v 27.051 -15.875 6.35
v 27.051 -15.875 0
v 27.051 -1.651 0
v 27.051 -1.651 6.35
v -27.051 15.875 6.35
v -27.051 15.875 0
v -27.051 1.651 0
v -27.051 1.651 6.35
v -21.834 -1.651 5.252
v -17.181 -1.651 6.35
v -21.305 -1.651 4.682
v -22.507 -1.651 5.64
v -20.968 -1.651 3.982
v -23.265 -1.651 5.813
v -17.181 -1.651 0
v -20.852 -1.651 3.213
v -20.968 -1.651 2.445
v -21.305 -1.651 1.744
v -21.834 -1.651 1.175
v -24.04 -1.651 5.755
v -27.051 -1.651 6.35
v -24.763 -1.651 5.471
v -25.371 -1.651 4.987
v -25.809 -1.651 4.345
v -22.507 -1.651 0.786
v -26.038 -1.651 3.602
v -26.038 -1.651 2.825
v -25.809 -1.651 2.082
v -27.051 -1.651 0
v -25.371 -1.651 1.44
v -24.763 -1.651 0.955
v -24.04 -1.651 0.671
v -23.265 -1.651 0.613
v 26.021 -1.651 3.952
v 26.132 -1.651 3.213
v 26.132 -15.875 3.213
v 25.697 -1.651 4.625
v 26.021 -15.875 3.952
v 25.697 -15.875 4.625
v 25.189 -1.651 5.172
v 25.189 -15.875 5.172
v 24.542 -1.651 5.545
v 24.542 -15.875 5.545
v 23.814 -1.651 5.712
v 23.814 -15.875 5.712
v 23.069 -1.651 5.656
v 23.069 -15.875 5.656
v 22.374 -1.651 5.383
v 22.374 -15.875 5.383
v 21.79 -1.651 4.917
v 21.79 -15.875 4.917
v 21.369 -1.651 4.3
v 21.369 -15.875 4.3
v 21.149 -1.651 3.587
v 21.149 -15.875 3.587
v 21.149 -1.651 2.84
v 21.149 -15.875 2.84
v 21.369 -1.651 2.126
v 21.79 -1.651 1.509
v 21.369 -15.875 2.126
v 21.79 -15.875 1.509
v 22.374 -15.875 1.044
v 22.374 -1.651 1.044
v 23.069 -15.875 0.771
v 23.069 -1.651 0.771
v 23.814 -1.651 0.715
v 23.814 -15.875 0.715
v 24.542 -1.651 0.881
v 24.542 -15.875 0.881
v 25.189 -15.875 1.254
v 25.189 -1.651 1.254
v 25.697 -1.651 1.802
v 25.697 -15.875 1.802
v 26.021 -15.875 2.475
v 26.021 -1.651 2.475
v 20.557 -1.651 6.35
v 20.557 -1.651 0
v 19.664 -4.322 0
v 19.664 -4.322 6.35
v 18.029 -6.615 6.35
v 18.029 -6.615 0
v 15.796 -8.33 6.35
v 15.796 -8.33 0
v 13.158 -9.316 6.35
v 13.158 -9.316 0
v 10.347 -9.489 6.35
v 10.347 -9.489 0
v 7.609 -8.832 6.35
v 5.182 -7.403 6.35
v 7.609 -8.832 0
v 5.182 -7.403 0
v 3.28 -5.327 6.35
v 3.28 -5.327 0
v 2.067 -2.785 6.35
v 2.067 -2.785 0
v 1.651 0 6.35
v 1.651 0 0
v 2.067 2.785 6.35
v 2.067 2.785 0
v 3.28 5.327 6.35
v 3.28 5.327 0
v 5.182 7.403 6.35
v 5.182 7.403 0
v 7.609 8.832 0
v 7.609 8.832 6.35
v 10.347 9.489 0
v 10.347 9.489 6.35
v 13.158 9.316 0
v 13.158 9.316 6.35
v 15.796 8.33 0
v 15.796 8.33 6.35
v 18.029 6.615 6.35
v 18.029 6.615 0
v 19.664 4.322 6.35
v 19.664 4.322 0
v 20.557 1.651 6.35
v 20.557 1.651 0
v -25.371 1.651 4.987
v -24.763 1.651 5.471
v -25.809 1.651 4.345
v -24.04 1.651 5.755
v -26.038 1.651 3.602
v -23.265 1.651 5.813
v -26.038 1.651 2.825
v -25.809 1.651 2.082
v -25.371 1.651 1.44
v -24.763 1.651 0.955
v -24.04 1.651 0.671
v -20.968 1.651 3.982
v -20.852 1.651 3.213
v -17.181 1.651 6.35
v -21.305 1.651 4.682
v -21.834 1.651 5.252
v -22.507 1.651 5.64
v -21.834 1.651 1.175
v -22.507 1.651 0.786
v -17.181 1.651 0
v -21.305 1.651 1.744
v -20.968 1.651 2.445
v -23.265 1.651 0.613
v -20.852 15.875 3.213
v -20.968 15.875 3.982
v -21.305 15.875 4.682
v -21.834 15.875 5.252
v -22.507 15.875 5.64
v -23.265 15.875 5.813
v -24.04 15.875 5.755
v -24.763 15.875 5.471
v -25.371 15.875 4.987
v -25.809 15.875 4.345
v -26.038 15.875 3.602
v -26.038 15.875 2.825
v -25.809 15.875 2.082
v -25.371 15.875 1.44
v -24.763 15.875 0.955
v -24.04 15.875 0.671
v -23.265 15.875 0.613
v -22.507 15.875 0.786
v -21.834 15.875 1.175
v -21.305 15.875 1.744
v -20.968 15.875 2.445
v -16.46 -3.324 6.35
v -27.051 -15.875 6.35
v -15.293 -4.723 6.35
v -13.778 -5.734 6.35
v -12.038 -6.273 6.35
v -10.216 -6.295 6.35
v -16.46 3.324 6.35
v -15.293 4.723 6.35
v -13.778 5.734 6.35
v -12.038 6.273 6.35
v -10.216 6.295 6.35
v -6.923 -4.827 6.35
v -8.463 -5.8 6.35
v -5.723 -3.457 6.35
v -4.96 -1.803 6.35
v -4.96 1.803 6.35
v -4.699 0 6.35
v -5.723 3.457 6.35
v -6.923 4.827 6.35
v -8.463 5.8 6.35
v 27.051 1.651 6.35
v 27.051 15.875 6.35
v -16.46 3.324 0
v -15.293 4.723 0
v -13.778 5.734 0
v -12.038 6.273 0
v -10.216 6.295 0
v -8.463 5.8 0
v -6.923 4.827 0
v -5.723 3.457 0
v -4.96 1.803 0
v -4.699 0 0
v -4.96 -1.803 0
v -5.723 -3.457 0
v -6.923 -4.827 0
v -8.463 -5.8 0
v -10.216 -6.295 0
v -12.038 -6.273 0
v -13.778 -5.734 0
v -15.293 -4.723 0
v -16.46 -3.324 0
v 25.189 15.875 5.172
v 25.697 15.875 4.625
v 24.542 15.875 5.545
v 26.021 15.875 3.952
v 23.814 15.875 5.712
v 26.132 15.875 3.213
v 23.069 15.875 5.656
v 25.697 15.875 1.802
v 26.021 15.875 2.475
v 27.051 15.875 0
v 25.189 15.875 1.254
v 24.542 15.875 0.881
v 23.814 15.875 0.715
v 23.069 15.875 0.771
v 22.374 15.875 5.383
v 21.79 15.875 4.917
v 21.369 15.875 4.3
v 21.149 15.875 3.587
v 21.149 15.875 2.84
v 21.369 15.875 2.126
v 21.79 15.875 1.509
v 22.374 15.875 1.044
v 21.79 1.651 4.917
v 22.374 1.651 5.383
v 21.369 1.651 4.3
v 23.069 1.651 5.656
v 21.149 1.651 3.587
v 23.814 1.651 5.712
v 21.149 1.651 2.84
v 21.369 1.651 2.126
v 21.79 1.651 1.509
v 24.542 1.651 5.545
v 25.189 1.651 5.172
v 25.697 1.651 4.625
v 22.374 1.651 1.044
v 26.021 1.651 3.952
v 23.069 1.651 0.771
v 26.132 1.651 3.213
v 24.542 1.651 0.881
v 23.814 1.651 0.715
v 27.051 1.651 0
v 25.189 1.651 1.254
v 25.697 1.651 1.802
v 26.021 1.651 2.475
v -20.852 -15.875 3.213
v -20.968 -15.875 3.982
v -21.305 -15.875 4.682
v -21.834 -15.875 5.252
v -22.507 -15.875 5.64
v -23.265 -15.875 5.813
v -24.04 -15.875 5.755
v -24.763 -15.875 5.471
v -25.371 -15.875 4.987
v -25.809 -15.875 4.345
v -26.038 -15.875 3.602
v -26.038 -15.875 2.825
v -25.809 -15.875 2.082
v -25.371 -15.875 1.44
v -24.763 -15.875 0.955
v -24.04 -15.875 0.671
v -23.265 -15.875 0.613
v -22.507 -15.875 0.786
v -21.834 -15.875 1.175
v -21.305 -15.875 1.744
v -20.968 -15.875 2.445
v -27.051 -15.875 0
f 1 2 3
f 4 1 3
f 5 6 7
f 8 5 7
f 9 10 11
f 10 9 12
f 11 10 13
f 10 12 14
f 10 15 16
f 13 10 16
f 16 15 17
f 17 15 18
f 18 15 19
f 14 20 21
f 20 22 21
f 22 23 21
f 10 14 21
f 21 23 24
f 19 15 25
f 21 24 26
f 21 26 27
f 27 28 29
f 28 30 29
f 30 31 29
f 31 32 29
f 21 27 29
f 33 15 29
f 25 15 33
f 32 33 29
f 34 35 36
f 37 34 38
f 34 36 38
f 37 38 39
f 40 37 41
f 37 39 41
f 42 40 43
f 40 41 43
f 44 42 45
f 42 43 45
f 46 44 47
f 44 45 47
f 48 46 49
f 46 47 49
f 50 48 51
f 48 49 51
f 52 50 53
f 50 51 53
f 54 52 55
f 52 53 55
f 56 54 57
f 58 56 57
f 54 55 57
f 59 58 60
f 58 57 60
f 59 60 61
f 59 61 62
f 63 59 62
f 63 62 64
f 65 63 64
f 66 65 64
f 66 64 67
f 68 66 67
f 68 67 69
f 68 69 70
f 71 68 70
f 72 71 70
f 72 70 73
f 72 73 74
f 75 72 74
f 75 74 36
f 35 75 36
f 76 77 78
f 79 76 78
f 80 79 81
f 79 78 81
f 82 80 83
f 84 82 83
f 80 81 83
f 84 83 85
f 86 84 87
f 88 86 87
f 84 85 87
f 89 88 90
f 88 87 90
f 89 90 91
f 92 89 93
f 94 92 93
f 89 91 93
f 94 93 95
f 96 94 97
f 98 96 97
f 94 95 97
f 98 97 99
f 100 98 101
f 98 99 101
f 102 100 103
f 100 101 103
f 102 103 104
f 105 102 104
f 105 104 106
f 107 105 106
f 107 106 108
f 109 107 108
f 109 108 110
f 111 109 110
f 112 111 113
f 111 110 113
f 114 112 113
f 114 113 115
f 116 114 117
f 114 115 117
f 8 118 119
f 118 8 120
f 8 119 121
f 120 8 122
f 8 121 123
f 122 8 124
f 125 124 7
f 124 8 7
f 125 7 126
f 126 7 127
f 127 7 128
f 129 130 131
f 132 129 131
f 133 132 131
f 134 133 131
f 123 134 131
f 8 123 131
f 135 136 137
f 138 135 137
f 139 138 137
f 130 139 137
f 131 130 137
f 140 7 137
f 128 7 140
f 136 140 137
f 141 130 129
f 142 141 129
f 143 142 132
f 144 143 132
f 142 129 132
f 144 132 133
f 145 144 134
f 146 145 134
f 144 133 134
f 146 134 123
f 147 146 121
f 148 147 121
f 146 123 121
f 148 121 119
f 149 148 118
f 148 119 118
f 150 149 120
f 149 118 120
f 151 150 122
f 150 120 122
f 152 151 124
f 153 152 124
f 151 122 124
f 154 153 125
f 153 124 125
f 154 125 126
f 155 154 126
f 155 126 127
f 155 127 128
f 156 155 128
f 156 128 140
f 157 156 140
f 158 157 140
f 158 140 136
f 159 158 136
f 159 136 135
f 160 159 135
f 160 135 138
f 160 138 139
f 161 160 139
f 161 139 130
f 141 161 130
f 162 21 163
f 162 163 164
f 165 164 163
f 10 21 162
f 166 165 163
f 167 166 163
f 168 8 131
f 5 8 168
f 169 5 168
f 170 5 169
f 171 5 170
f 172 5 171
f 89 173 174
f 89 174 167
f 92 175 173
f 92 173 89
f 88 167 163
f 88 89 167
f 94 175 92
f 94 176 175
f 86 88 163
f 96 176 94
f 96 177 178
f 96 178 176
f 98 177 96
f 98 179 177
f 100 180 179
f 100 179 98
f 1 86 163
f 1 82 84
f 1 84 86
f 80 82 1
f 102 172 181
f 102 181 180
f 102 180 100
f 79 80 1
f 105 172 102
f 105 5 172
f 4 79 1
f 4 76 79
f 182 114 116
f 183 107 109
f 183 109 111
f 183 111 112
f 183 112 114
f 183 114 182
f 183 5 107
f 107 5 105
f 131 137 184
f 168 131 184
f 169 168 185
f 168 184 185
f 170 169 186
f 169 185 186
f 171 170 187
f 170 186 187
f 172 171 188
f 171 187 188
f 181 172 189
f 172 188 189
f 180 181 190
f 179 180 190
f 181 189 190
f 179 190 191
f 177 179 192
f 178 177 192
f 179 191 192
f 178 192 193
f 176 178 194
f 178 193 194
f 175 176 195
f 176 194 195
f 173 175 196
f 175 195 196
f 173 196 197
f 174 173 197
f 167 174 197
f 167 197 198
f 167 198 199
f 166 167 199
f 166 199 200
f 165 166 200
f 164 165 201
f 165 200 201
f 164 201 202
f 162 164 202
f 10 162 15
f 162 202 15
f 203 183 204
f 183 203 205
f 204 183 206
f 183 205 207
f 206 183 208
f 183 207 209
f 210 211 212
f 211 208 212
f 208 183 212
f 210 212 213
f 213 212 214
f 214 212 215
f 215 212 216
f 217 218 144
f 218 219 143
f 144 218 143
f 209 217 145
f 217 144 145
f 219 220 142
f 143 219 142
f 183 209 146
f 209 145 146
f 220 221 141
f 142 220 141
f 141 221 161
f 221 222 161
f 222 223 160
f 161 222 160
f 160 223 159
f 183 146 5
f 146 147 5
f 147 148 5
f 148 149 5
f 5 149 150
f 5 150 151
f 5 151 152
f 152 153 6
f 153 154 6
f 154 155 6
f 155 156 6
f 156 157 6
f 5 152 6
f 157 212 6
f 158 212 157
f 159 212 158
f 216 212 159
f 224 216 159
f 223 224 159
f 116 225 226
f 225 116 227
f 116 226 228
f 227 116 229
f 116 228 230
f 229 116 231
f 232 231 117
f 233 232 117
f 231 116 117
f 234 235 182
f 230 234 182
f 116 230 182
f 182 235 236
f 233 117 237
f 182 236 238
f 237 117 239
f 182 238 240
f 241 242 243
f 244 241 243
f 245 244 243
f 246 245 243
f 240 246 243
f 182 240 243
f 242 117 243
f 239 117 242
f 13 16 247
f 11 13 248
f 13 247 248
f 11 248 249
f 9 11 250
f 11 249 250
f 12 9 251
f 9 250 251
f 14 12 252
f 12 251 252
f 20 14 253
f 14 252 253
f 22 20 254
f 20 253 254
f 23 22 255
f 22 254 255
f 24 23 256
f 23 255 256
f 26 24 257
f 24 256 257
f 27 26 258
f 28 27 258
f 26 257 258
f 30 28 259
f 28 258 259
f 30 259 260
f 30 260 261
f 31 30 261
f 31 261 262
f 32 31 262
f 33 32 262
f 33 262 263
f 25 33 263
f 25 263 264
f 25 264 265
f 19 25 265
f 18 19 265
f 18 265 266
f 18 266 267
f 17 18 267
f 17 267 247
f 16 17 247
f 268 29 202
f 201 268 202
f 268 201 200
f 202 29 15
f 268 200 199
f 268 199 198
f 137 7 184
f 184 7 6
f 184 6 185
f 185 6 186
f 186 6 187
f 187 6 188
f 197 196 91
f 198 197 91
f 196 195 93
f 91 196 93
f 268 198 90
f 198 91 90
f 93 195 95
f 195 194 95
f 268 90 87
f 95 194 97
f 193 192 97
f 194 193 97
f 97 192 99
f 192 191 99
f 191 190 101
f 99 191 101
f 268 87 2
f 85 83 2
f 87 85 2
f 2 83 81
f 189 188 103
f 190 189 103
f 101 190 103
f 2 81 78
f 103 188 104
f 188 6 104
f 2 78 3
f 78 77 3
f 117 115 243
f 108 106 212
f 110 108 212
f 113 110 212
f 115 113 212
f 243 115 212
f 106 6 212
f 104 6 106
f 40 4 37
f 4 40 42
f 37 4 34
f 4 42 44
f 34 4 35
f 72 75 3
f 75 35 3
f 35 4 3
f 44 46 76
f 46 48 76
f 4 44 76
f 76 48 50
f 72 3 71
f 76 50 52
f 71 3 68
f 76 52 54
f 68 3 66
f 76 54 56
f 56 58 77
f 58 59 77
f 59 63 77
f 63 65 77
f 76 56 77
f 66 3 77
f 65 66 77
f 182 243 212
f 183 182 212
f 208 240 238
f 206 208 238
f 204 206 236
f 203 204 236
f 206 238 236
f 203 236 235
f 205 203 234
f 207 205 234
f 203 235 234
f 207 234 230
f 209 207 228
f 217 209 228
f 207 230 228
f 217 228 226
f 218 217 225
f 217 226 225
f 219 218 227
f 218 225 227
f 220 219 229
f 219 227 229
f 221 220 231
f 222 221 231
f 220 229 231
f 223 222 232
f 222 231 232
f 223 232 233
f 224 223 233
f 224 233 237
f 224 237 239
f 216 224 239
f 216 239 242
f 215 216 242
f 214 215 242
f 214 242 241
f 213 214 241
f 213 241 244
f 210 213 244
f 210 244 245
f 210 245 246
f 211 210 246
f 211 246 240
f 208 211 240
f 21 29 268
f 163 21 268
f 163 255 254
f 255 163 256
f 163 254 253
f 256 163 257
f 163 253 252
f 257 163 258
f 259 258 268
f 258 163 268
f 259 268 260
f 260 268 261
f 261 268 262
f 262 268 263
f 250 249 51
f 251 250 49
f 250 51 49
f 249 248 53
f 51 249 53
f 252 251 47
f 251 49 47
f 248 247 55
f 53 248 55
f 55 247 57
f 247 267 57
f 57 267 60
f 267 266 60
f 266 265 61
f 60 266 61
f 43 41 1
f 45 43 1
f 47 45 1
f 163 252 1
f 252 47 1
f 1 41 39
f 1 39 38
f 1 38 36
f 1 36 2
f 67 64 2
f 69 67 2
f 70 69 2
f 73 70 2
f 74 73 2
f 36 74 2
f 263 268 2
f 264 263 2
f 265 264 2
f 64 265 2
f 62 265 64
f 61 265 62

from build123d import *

# Parameters (mm, degrees)
F1_DEPTH = 6.35
F2_R     = 2.607483
F2_R_2   = 2.505418
F3_DEPTH = 34.29


with BuildPart() as f1:
    # F0 (on Top) → F1 (new body)
    with BuildSketch(Plane.XY):
        with BuildLine():
            Line((27.051, 15.875), (-27.051, 15.875))
            Line((-27.051, 15.875), (-27.051, 1.651))
            Line((-27.051, 1.651), (-17.180615, 1.651))
            ThreePointArc((-17.180615, 1.651), (-4.699, 0), (-17.180615, -1.651))
            Line((-17.180615, -1.651), (-27.051, -1.651))
            Line((-27.051, -1.651), (-27.051, -15.875))
            Line((-27.051, -15.875), (27.051, -15.875))
            Line((27.051, -15.875), (27.051, -1.651))
            Line((27.051, -1.651), (20.556822, -1.651))
            ThreePointArc((20.556822, -1.651), (1.651, 0), (20.556822, 1.651))
            Line((20.556822, 1.651), (27.051, 1.651))
            Line((27.051, 1.651), (27.051, 15.875))
        make_face()
    extrude(amount=F1_DEPTH)

    # F2 (on face) → F3 (cut)
    with BuildSketch(Plane.XZ.offset(15.875)):
        with Locations((-23.459613, 3.213262)):
            Circle(F2_R)
        with Locations((23.626484, 3.213262)):
            Circle(F2_R_2)
    extrude(amount=-F3_DEPTH, mode=Mode.SUBTRACT)


solid = f1.part
